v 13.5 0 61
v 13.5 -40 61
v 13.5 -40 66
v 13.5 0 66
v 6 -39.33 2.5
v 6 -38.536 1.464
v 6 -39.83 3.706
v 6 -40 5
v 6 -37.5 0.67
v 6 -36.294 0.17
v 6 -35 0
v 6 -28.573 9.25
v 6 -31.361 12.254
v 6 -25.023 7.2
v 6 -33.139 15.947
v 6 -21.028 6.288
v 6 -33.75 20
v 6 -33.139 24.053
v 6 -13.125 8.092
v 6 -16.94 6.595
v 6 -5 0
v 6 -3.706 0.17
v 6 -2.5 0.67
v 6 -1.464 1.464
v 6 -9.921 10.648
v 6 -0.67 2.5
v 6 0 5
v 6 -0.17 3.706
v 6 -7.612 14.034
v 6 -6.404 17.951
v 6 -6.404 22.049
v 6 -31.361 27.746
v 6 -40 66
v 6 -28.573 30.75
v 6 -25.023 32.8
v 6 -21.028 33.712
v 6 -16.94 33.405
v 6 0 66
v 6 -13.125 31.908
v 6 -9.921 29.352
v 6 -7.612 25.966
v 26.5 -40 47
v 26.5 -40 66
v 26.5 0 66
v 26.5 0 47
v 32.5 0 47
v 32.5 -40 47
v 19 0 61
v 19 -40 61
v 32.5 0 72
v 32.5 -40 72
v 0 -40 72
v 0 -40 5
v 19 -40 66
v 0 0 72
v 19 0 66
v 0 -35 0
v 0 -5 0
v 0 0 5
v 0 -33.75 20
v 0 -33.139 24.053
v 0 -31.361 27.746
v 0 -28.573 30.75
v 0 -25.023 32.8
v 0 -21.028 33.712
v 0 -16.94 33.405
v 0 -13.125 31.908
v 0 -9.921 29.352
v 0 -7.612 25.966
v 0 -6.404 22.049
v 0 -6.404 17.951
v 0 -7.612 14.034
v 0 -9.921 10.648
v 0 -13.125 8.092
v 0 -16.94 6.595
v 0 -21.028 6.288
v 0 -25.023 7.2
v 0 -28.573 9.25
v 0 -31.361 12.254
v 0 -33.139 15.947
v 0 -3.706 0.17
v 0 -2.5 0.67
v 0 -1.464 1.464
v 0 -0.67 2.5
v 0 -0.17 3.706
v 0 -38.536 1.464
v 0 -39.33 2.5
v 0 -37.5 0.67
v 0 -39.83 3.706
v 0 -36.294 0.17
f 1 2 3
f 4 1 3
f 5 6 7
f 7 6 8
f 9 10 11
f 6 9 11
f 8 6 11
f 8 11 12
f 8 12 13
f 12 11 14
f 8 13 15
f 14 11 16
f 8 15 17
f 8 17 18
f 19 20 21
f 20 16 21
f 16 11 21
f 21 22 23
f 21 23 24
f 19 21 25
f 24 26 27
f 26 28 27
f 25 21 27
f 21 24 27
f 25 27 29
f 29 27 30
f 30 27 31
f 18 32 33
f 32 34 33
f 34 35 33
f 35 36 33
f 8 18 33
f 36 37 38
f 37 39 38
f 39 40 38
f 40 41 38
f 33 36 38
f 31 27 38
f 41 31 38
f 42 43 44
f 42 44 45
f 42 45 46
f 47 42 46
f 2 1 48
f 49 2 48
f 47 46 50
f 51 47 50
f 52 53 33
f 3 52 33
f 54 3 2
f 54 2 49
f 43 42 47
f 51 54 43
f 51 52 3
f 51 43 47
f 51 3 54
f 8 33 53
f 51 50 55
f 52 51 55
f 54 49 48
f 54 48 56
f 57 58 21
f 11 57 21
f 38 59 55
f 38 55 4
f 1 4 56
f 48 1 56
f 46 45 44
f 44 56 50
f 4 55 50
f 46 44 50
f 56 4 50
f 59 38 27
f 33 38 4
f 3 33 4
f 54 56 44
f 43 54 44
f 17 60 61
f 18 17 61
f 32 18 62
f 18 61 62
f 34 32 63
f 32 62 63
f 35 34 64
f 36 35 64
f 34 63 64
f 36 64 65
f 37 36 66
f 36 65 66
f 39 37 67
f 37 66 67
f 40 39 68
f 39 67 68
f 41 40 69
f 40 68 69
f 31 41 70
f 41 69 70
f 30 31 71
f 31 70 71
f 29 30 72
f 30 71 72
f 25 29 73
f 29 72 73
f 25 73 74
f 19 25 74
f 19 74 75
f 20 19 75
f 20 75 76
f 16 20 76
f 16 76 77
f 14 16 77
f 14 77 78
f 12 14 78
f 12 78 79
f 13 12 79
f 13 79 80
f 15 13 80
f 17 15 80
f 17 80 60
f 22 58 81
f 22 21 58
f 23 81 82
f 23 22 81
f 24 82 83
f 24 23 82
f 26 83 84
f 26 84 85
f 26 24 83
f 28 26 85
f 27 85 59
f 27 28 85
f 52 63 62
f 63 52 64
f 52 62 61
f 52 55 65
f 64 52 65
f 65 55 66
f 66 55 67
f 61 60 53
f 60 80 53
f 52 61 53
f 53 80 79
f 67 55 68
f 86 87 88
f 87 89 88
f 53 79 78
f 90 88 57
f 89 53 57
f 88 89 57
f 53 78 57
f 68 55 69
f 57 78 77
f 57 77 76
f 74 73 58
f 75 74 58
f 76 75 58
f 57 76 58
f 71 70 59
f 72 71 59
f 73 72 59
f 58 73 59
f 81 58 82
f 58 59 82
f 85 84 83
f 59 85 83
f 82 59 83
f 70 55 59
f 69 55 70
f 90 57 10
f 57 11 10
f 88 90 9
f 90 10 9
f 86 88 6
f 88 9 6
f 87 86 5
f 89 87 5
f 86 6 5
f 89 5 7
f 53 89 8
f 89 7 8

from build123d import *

# Parameters (mm, degrees)
F0_W     = 5.5
F0_H     = 5
F0_W_2   = 7.5
F0_H_2   = 6
F1_DEPTH = 40
F2_R     = 5
F3_R     = 13.75
F4_DEPTH = 25


with BuildPart() as f1:
    # F0 (on Front) → F1 (new body)
    with BuildSketch(Plane.XZ):
        Polygon((0, 72), (0, 0), (6, 0), (6, 66), (6, 72), align=None)
        Polygon((6, 72), (6, 66), (13.5, 66), (19, 66), (19, 72), align=None)
        with Locations((16.25, 63.5)):
            Rectangle(F0_W, F0_H)
        with Locations((22.75, 69)):
            Rectangle(F0_W_2, F0_H_2)
        Polygon((32.5, 72), (26.5, 72), (26.5, 66), (26.5, 47), (32.5, 47), align=None)
    extrude(amount=F1_DEPTH)

    # F2
    f2_edges = [f1.edges().sort_by_distance(p)[0] for p in [
        (3, 0, 0),
        (3, -40, 0),
    ]]
    fillet(f2_edges, radius=F2_R)

    # F3 (on face) → F4 (cut)
    with BuildSketch(Plane(origin=(0, 0, 0), x_dir=(0, -1, 0), z_dir=(-1, 0, 0))):
        with Locations((20, 20)):
            Circle(F3_R)
    extrude(amount=-F4_DEPTH, mode=Mode.SUBTRACT)


solid = f1.part
